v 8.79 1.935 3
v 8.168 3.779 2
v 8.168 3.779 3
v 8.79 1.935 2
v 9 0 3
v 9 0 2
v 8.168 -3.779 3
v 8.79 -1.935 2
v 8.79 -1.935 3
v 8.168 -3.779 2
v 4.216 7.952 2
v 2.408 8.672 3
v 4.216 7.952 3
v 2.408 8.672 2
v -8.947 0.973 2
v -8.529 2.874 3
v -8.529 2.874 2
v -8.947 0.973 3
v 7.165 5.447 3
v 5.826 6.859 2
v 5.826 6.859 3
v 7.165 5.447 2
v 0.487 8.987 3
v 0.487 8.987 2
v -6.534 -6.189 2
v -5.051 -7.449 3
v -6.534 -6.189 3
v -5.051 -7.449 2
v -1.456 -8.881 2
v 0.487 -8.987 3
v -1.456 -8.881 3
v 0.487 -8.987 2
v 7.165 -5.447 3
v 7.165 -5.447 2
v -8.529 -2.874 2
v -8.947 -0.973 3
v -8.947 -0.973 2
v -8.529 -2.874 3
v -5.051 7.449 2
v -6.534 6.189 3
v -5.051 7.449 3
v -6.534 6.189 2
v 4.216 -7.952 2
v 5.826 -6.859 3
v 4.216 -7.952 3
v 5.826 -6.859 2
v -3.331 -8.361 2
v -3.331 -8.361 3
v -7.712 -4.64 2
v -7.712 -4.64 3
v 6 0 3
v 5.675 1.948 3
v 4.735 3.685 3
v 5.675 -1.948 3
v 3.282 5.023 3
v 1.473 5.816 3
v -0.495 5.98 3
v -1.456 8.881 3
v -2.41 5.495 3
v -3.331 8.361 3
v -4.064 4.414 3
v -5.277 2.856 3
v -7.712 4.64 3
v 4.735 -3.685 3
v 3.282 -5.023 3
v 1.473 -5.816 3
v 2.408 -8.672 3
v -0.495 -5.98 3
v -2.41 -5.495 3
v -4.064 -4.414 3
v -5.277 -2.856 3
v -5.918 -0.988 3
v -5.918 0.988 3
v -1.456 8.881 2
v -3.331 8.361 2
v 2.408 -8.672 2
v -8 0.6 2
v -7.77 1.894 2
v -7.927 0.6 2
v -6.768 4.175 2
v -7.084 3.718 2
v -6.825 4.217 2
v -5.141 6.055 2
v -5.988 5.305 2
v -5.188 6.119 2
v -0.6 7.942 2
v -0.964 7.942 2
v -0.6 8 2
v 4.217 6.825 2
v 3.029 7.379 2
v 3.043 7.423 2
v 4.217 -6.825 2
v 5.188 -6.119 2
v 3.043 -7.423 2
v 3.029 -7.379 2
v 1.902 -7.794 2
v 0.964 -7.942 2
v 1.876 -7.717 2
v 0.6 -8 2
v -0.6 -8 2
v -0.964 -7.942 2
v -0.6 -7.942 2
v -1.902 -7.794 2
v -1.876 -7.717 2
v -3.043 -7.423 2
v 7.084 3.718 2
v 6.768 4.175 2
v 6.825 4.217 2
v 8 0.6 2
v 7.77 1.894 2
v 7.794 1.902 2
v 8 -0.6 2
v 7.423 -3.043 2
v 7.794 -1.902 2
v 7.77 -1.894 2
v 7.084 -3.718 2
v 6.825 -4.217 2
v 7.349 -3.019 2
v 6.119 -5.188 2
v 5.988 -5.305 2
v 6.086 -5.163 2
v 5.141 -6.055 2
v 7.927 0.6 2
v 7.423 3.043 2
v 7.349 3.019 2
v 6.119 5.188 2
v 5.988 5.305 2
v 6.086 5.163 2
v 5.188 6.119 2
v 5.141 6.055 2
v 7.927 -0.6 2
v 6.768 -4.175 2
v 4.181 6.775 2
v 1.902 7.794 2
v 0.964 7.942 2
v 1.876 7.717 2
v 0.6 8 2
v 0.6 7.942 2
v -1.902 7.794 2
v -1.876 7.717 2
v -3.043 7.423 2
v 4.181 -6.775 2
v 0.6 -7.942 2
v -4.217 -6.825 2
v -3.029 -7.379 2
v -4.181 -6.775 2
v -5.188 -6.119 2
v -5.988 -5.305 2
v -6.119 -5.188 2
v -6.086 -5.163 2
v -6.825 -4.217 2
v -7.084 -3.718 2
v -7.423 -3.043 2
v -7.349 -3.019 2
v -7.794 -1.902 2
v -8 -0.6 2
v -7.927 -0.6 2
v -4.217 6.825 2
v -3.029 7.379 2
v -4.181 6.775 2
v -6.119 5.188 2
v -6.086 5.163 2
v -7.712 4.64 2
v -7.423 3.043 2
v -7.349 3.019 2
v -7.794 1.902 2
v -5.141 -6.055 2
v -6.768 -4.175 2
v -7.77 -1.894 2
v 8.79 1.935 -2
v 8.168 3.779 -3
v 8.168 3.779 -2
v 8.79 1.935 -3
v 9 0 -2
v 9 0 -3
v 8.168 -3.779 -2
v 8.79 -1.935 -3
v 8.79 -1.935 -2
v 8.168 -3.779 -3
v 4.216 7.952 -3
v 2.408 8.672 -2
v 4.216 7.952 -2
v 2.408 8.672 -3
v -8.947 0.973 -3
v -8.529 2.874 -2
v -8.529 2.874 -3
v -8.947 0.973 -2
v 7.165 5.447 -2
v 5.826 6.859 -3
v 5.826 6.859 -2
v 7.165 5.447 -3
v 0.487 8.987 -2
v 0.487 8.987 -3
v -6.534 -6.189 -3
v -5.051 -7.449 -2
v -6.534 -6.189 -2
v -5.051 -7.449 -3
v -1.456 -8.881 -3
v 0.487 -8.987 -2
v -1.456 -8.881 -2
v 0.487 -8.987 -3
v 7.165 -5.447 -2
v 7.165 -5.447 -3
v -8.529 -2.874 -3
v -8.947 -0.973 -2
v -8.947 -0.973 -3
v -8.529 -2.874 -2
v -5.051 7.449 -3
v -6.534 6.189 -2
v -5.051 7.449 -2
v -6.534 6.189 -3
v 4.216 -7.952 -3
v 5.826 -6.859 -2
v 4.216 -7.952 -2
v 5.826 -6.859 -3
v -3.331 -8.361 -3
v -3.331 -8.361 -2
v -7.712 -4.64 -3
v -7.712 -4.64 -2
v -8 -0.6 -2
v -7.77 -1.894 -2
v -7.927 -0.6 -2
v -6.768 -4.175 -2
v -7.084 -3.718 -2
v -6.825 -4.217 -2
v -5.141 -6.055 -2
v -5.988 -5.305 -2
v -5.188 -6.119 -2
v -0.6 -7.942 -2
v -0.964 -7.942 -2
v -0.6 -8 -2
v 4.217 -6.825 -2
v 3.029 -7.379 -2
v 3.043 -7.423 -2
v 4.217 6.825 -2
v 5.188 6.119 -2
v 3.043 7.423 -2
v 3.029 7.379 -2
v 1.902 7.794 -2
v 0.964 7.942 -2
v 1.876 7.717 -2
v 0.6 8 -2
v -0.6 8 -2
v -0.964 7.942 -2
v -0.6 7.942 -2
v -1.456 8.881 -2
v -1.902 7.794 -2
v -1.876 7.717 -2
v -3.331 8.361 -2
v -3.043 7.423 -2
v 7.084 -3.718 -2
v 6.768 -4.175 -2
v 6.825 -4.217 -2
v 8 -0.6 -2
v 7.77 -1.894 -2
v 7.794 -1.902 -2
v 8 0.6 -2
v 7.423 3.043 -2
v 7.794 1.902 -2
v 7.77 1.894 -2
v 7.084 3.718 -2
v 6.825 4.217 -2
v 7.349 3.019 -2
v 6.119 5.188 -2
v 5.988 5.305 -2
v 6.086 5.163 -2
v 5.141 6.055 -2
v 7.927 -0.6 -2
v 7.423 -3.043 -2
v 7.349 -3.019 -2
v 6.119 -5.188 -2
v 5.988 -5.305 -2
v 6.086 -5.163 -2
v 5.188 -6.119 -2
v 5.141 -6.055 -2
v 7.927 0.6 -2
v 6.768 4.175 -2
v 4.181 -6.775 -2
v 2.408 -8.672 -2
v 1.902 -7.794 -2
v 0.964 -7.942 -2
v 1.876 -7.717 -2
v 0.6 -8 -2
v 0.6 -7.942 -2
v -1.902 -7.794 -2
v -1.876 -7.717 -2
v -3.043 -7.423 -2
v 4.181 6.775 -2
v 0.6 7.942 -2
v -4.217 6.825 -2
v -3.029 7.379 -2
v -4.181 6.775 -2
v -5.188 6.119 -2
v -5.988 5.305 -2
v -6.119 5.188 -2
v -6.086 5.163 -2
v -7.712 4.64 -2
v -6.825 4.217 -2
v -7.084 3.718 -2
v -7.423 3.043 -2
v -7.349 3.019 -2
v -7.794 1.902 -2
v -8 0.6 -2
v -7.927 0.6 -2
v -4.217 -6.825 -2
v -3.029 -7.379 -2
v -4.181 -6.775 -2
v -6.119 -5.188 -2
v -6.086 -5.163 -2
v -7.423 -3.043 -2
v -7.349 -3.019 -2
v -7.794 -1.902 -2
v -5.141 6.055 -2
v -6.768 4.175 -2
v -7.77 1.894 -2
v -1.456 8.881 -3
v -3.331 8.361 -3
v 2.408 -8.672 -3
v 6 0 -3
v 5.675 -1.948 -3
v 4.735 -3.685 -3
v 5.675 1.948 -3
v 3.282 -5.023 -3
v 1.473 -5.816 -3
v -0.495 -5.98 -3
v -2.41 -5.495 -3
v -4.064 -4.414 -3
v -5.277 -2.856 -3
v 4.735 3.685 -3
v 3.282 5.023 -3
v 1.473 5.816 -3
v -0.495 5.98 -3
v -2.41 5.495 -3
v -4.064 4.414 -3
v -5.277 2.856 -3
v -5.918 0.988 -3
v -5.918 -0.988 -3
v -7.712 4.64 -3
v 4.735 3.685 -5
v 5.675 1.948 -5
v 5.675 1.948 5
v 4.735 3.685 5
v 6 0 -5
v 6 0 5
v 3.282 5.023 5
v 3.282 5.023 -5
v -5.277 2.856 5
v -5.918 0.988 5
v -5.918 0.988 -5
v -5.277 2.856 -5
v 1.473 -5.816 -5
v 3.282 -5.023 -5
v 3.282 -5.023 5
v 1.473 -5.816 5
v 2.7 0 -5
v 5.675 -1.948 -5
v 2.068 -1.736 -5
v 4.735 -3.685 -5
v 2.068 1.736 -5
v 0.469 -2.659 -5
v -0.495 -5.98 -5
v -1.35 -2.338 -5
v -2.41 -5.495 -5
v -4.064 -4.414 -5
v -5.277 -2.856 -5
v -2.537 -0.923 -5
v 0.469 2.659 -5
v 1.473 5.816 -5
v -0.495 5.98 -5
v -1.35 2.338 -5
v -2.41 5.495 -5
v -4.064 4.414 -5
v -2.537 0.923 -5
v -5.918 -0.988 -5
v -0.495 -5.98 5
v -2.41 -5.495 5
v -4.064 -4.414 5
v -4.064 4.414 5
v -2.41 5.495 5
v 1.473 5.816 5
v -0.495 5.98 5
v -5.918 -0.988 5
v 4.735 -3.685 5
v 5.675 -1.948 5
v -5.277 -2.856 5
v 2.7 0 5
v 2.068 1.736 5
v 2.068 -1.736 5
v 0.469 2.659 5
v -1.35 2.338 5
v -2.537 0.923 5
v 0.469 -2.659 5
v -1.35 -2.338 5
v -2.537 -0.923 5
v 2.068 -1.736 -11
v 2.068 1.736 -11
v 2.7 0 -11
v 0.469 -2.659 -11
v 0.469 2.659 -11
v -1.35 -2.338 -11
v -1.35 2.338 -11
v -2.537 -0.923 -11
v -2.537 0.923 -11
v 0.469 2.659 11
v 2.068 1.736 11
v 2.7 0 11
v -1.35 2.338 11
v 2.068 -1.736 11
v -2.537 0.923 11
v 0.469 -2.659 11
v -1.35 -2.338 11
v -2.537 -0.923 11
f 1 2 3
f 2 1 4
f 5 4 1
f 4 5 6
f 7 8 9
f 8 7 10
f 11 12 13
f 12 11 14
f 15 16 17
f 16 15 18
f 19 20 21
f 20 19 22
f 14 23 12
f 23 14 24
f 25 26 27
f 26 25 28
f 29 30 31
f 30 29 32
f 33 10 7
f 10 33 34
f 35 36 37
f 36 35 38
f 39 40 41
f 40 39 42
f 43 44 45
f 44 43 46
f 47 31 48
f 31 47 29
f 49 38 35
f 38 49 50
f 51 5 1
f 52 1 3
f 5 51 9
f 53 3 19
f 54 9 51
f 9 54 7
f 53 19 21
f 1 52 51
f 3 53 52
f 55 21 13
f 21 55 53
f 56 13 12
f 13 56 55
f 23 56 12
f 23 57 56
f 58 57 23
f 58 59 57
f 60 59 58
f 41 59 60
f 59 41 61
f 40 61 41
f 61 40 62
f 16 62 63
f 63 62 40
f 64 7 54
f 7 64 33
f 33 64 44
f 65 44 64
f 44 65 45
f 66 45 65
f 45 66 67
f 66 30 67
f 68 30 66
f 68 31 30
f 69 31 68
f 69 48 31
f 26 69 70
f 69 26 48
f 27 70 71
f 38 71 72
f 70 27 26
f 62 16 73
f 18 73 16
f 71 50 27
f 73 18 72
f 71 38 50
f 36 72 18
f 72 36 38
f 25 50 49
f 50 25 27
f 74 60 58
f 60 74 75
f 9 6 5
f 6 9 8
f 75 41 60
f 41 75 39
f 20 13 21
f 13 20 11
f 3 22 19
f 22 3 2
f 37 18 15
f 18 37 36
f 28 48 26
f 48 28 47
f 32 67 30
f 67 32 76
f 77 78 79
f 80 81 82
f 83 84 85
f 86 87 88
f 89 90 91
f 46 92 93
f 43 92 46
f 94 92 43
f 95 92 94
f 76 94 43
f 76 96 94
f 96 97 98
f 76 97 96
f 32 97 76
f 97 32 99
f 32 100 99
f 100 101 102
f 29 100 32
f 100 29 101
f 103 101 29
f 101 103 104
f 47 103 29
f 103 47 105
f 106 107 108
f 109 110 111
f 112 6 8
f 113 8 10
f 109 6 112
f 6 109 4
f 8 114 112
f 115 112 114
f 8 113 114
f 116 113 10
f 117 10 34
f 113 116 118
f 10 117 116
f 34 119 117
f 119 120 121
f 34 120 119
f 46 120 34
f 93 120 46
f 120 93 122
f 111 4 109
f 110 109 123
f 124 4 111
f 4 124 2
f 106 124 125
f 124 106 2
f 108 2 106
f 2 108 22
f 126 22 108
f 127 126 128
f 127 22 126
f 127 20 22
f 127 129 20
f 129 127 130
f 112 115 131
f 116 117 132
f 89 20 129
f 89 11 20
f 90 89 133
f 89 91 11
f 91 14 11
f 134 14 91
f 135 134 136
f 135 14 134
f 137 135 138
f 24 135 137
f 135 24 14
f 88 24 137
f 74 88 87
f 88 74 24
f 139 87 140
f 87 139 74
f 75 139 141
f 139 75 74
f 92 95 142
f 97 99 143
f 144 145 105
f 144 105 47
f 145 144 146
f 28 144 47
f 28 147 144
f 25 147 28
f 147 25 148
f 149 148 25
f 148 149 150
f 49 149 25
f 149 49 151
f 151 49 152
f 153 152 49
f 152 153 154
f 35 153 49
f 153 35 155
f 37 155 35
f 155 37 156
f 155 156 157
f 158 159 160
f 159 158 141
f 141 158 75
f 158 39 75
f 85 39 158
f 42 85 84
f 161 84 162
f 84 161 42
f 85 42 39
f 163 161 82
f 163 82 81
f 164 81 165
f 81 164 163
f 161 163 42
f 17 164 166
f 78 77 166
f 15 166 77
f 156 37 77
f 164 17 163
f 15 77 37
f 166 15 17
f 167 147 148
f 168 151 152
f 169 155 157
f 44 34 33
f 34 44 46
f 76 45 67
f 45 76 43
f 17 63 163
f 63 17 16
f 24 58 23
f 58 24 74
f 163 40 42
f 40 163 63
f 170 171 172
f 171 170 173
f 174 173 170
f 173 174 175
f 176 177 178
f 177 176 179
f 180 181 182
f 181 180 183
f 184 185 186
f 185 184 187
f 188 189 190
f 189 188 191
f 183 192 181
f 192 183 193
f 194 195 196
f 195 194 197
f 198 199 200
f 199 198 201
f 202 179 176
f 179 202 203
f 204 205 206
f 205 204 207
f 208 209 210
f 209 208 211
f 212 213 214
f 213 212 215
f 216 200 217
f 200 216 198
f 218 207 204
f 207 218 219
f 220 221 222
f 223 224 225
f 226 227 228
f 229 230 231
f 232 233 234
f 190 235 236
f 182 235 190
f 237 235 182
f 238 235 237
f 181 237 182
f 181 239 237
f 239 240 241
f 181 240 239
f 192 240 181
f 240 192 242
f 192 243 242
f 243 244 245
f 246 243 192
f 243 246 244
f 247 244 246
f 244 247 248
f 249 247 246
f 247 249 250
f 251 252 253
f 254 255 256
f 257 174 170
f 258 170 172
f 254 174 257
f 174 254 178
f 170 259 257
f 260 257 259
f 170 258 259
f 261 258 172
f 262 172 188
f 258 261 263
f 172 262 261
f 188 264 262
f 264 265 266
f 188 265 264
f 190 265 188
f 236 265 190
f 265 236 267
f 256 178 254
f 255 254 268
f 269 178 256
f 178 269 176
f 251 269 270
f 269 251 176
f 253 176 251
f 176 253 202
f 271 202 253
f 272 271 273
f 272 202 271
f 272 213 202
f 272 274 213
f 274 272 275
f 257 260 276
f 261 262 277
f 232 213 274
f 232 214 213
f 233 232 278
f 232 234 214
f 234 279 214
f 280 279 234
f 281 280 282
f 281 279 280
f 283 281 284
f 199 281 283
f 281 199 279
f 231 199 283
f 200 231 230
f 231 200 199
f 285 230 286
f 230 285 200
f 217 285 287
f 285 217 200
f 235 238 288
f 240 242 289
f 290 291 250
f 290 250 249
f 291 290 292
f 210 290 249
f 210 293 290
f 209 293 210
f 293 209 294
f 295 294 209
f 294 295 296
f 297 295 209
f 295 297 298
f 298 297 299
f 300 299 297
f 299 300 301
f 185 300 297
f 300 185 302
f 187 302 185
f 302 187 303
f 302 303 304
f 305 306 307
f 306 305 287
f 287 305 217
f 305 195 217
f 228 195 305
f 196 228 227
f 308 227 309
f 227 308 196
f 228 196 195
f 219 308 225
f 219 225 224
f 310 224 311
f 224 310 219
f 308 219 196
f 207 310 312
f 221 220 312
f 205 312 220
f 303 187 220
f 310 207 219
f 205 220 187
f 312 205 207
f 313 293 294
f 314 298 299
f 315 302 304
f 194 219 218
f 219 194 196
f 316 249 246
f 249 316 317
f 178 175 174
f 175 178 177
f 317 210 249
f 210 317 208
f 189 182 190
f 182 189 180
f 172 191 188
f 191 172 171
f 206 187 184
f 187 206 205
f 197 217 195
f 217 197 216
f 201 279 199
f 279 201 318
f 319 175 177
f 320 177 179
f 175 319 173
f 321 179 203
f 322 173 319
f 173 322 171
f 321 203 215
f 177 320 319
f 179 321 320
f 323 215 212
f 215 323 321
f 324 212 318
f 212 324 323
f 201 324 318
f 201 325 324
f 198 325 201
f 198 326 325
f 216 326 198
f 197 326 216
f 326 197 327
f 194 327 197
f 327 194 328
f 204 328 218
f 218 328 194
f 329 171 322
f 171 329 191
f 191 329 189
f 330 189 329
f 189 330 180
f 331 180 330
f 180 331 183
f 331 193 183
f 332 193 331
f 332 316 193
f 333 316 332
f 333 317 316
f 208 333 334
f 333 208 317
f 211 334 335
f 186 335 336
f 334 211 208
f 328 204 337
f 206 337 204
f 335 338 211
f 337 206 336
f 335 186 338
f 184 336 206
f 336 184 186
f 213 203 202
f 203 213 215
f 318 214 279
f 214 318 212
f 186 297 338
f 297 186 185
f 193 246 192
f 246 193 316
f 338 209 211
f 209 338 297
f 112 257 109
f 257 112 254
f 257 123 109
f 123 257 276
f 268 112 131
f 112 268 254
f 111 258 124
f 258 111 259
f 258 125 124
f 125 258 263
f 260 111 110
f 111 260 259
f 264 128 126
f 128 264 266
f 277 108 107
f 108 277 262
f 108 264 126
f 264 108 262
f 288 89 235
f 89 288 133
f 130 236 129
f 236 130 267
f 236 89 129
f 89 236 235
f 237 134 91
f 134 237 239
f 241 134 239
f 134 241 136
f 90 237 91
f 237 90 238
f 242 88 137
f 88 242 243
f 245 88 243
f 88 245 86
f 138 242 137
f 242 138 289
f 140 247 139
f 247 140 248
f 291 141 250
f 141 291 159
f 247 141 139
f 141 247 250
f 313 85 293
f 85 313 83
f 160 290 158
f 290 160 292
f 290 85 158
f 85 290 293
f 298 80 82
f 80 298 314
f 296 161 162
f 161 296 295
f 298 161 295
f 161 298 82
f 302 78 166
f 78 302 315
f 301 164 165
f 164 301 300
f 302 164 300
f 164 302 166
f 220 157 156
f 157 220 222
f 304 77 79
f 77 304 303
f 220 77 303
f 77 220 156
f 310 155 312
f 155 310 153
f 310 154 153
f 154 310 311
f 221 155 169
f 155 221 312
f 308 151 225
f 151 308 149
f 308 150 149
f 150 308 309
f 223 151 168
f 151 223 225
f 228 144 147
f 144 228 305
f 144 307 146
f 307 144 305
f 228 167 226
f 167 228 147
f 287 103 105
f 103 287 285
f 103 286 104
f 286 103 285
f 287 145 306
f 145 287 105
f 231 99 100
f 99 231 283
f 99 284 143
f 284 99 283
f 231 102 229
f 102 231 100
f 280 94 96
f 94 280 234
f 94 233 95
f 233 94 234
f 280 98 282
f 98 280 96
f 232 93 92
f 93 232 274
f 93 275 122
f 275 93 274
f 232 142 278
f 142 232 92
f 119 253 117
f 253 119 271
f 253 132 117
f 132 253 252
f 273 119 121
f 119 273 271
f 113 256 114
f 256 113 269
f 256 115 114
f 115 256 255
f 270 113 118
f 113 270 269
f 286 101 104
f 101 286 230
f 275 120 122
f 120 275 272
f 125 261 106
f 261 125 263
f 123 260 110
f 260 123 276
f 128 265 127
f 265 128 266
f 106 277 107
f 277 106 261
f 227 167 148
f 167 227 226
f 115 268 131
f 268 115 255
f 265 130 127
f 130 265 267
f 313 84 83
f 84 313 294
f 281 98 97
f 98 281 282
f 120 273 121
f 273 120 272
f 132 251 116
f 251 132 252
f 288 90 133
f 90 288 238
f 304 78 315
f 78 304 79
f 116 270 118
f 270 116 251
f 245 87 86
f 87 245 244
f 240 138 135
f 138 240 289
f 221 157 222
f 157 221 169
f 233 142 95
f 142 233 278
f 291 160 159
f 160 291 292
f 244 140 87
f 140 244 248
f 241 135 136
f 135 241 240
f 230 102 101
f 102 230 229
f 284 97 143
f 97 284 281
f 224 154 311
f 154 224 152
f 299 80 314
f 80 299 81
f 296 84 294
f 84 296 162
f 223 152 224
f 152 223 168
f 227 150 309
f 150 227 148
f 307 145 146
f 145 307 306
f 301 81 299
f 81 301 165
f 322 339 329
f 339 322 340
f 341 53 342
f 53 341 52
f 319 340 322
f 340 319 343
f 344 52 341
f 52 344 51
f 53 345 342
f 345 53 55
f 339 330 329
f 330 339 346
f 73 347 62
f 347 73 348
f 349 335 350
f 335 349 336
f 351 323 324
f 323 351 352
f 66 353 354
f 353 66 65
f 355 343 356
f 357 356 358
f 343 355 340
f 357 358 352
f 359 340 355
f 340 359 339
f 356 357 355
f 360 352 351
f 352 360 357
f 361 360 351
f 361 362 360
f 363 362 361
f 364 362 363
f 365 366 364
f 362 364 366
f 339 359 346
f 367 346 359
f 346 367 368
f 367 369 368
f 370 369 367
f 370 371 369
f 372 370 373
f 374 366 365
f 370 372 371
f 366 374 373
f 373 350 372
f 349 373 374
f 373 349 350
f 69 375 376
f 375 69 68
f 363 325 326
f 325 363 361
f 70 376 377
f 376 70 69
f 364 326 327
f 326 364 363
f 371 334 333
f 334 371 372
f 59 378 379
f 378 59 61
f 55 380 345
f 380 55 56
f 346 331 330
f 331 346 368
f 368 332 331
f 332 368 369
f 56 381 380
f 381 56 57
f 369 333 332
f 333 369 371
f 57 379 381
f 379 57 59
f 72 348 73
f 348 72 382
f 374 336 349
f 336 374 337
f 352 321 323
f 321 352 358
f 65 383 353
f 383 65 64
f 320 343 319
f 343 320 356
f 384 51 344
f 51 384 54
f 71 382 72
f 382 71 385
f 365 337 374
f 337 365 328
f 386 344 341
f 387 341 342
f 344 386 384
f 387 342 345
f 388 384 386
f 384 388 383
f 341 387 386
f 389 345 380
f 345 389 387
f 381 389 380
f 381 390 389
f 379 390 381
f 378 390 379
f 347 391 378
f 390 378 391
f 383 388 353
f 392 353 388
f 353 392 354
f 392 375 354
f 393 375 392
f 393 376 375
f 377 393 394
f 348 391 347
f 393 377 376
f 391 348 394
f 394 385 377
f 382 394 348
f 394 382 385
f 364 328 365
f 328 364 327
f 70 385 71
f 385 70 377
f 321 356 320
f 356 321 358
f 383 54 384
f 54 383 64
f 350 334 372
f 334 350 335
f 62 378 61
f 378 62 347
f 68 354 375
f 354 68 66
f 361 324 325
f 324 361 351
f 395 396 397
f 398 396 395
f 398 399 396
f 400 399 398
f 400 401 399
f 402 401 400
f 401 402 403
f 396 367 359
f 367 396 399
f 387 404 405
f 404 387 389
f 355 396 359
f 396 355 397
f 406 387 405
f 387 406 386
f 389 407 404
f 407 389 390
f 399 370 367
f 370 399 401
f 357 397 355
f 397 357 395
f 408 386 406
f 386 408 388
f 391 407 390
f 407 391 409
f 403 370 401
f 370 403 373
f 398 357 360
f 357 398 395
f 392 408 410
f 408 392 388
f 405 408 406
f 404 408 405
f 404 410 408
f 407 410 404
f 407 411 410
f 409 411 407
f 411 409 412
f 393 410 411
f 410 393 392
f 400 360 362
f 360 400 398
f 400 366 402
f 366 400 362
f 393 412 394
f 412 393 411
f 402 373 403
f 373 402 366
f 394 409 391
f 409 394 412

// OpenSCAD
// Parameters
pulley_type = 0; //[0:1:1]
teeth_count = 20; //[10:60:1]
outer_diameter_mm = 16; //[8:32:1]
belt_pitch_mm = 2; //[1:5:0.5]
width_mm = 6; //[3:20:1]
bore_diameter_mm = 5; //[2:12:0.5]
hub_diameter_mm = 12; //[6:24:1]
hub_length_mm = 10; //[5:25:1]
flange_enabled = 1; //[0:1:1]
flange_diameter_mm = 18; //[10:36:1]
flange_thickness_mm = 1; //[0.5:4:0.5]
set_screw_enabled = 1; //[0:1:1]
set_screw_count = 1; //[1:4:1]
set_screw_diameter_mm = 3; //[2:6:0.5]
set_screw_z_offset_mm = 5; //[0:20:1]
flat_enabled = 0; //[0:1:1]
flat_depth_mm = 0.8; //[0.4:2:0.1]
overlap_mm = 1; //[0.5:2:0.5]
clearance_mm = 0.2; //[0:0.6:0.05]
rim_radius = 8; //[4:16:1]
hub_radius = 6; //[3:12:1]
bore_radius = 2.5; //[1:6:0.5]
tooth_radial_height_mm = 0.8; //[0.4:2:0.1]
tooth_tangential_width_mm = 1.2; //[0.6:3:0.1]

// Pulley module
module pulley() {
  color("Silver") {
    // Pulley body
    cylinder(r=outer_diameter_mm/2, h=width_mm, center=true);

    // Hub
    translate([0, 0, 0])
      cylinder(r=hub_diameter_mm/2, h=hub_length_mm, center=true);

    // Flanges
    if (flange_enabled) {
      translate([0, 0, width_mm/2 + flange_thickness_mm/2 - overlap_mm])
        cylinder(r=flange_diameter_mm/2, h=flange_thickness_mm, center=true);
      translate([0, 0, -width_mm/2 - flange_thickness_mm/2 + overlap_mm])
        cylinder(r=flange_diameter_mm/2, h=flange_thickness_mm, center=true);
    }

    // Teeth for timing pulley
    if (pulley_type == 0) {
      for (i = [0:teeth_count-1]) {
        rotate([0, 0, i*360/teeth_count])
          translate([outer_diameter_mm/2 - tooth_radial_height_mm/2, 0, 0])
            cube([tooth_radial_height_mm, tooth_tangential_width_mm, width_mm], center=true);
      }
    }

    // Bore hole
    difference() {
      cylinder(r=bore_diameter_mm/2 + clearance_mm, h=hub_length_mm + width_mm + 2*flange_thickness_mm + 4*overlap_mm, center=true);
      
      // Flat cut for D-bore
      if (flat_enabled) {
        translate([bore_diameter_mm/2 + clearance_mm - flat_depth_mm, 0, 0])
          cube([2*(bore_diameter_mm/2 + clearance_mm), 2*(bore_diameter_mm/2 + clearance_mm), hub_length_mm + width_mm + 2*flange_thickness_mm + 4*overlap_mm], center=true);
      }
    }

    // Set screw holes
    if (set_screw_enabled) {
      for (i = [0:set_screw_count-1]) {
        rotate([0, 0, i*360/set_screw_count])
          translate([0, 0, -hub_length_mm/2 + set_screw_z_offset_mm])
            rotate([0, 90, 0])
              cylinder(r=set_screw_diameter_mm/2 + clearance_mm, h=hub_diameter_mm + 2*overlap_mm, center=true);
      }
    }
  }
}

// Assembly
module assembly() {
  pulley();
}

assembly();
